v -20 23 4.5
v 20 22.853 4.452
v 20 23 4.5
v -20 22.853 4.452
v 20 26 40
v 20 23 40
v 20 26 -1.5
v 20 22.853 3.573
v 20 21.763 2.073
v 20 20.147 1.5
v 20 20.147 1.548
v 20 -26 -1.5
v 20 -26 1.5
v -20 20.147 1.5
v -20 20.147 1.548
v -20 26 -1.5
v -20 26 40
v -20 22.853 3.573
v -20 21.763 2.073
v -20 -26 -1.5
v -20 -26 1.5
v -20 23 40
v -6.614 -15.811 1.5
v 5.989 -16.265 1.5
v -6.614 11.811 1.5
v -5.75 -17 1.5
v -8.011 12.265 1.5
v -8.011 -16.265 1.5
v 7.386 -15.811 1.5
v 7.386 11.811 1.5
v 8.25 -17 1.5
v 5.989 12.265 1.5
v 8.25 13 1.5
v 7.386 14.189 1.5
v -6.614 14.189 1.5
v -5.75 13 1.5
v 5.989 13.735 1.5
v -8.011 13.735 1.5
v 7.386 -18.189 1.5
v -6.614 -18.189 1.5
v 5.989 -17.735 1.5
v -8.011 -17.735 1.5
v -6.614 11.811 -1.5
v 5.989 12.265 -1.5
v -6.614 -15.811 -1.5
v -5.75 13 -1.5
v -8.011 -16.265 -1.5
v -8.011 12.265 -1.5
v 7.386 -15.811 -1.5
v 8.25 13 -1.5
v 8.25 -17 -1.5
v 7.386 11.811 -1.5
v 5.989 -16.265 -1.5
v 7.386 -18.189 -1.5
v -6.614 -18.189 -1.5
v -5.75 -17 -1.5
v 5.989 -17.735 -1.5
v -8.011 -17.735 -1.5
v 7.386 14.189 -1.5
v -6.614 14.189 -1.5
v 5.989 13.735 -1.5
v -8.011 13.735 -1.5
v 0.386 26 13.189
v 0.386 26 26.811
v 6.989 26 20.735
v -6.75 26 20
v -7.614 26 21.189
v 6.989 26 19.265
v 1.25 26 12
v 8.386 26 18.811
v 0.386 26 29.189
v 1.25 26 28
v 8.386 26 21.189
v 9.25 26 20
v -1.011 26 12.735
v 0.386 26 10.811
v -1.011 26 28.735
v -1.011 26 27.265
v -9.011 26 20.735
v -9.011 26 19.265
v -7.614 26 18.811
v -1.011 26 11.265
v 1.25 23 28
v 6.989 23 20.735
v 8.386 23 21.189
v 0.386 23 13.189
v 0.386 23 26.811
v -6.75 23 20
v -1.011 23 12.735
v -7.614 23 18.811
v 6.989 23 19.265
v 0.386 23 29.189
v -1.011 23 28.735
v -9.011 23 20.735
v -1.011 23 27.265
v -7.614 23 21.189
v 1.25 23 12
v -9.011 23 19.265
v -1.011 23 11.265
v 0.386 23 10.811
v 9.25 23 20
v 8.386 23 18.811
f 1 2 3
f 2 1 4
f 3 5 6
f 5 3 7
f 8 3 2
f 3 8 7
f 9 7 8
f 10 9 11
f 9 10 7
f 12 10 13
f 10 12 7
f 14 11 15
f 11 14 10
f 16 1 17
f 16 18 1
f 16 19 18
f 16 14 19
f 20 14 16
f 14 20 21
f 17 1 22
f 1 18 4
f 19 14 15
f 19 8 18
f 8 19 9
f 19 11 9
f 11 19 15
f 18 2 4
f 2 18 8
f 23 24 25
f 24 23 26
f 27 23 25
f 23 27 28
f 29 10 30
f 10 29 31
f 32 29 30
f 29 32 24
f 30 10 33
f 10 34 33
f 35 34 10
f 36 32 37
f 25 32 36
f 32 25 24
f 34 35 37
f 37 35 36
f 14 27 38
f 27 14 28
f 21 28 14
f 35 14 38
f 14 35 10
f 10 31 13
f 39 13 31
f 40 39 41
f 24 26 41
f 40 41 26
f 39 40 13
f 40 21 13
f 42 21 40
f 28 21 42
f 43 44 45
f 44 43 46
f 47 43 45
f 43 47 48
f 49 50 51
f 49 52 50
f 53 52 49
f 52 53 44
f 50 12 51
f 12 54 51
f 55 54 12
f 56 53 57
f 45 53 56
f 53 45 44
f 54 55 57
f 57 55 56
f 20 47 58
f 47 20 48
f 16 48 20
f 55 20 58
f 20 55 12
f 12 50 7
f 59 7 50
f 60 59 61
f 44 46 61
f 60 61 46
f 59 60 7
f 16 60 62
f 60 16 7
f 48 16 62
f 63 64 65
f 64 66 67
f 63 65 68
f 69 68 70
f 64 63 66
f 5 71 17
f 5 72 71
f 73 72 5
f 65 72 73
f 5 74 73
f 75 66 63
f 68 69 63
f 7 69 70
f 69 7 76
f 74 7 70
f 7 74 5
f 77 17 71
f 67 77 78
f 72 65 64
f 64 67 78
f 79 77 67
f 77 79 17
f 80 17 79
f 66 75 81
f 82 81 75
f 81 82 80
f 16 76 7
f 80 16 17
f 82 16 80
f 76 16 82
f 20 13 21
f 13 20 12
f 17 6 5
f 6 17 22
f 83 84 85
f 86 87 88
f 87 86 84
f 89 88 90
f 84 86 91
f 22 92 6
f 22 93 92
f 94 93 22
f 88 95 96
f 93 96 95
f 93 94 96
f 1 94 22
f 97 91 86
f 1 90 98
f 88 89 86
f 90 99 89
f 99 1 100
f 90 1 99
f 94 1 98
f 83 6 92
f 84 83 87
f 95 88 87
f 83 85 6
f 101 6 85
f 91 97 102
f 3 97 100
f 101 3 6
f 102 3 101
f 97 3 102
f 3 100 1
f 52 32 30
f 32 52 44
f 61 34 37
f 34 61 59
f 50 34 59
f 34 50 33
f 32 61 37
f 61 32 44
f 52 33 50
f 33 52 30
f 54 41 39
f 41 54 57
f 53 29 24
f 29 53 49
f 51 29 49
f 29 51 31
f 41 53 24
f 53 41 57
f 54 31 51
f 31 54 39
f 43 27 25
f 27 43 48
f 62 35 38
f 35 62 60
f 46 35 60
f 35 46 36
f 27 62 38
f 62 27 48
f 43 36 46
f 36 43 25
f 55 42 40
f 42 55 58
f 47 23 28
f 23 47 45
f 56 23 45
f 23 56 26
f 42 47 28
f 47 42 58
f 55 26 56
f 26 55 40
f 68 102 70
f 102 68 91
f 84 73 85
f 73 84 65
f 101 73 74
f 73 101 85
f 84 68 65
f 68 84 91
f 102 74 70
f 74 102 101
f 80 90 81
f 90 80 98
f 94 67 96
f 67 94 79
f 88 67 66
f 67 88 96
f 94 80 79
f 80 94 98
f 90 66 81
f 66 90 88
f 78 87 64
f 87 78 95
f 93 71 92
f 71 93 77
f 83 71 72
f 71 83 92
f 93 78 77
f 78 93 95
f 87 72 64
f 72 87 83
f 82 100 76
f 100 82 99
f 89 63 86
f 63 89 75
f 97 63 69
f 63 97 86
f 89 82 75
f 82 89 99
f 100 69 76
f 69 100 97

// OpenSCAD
module MotorMountHoles(depth) {
  mount_width = 16;
  mount_height = 16;
  screw_type = 2.5;

  translate([mount_width / 2.0, 0.0]) {
    #cylinder(r=screw_type / 2.0, h=depth, center=true);
  }
  translate([-mount_width / 2.0, 0.0]) {
    #cylinder(r=screw_type / 2.0, h=depth, center=true);
  }

  translate([0.0, mount_height / 2.0]) {
    #cylinder(r=screw_type / 2.0, h=depth, center=true);
  }
  translate([0.0, -mount_height / 2.0]) {
    #cylinder(r=screw_type / 2.0, h=depth, center=true);
  }
}

module PointGreyMountHoles(depth) {
  mount_width = 30;
  mount_height = 14;
  screw_type = 2.5;

  translate([mount_height / 2.0, mount_width / 2.0]) {
    #cylinder(r=screw_type / 2.0, h=depth, center=true);
  }
  translate([mount_height / 2.0, -mount_width / 2.0]) {
    #cylinder(r=screw_type / 2.0, h=depth, center=true);
  }
  translate([-mount_height / 2.0, mount_width / 2.0]) {
    #cylinder(r=screw_type / 2.0, h=depth, center=true);
  }
  translate([-mount_height / 2.0, -mount_width / 2.0]) {
    #cylinder(r=screw_type / 2.0, h=depth, center=true);
  }
}

module GimbalBracket(width, length, depth) {
  cube([width, length, depth], center=true);
  translate([0.0, (length / 2.0) - depth / 2.0, width / 2.0]) {
    cube([width, depth, width], center=true);
  }

  // fillet
  translate([0, (length / 2.0) - depth, depth / 2.0]) {
      rotate([0, 90]) {
        difference() {
            cylinder(r=3, h=width, center=true);
            translate([-3.0, -3.0, 0.0]) {
              cylinder(r=3, h=width, center=true);
            }
        }
      }
  }
}

difference() {
  bracket_width = 40;
  bracket_length = 52;
  bracket_depth = 3;

  // gimbal bracket
  GimbalBracket(bracket_width, bracket_length, bracket_depth);

  // camera mount holes
  translate([0.0, -2.0, 0.0]) {
    PointGreyMountHoles(bracket_depth + 0.01);
  }

  // motor mount holes
  translate([0.0, (bracket_length / 2.0) - (bracket_depth / 2.0), 20]) {
    rotate([90.0, 0.0, 0.0]) {
      MotorMountHoles(bracket_depth + 0.01);
    }
  }
}
